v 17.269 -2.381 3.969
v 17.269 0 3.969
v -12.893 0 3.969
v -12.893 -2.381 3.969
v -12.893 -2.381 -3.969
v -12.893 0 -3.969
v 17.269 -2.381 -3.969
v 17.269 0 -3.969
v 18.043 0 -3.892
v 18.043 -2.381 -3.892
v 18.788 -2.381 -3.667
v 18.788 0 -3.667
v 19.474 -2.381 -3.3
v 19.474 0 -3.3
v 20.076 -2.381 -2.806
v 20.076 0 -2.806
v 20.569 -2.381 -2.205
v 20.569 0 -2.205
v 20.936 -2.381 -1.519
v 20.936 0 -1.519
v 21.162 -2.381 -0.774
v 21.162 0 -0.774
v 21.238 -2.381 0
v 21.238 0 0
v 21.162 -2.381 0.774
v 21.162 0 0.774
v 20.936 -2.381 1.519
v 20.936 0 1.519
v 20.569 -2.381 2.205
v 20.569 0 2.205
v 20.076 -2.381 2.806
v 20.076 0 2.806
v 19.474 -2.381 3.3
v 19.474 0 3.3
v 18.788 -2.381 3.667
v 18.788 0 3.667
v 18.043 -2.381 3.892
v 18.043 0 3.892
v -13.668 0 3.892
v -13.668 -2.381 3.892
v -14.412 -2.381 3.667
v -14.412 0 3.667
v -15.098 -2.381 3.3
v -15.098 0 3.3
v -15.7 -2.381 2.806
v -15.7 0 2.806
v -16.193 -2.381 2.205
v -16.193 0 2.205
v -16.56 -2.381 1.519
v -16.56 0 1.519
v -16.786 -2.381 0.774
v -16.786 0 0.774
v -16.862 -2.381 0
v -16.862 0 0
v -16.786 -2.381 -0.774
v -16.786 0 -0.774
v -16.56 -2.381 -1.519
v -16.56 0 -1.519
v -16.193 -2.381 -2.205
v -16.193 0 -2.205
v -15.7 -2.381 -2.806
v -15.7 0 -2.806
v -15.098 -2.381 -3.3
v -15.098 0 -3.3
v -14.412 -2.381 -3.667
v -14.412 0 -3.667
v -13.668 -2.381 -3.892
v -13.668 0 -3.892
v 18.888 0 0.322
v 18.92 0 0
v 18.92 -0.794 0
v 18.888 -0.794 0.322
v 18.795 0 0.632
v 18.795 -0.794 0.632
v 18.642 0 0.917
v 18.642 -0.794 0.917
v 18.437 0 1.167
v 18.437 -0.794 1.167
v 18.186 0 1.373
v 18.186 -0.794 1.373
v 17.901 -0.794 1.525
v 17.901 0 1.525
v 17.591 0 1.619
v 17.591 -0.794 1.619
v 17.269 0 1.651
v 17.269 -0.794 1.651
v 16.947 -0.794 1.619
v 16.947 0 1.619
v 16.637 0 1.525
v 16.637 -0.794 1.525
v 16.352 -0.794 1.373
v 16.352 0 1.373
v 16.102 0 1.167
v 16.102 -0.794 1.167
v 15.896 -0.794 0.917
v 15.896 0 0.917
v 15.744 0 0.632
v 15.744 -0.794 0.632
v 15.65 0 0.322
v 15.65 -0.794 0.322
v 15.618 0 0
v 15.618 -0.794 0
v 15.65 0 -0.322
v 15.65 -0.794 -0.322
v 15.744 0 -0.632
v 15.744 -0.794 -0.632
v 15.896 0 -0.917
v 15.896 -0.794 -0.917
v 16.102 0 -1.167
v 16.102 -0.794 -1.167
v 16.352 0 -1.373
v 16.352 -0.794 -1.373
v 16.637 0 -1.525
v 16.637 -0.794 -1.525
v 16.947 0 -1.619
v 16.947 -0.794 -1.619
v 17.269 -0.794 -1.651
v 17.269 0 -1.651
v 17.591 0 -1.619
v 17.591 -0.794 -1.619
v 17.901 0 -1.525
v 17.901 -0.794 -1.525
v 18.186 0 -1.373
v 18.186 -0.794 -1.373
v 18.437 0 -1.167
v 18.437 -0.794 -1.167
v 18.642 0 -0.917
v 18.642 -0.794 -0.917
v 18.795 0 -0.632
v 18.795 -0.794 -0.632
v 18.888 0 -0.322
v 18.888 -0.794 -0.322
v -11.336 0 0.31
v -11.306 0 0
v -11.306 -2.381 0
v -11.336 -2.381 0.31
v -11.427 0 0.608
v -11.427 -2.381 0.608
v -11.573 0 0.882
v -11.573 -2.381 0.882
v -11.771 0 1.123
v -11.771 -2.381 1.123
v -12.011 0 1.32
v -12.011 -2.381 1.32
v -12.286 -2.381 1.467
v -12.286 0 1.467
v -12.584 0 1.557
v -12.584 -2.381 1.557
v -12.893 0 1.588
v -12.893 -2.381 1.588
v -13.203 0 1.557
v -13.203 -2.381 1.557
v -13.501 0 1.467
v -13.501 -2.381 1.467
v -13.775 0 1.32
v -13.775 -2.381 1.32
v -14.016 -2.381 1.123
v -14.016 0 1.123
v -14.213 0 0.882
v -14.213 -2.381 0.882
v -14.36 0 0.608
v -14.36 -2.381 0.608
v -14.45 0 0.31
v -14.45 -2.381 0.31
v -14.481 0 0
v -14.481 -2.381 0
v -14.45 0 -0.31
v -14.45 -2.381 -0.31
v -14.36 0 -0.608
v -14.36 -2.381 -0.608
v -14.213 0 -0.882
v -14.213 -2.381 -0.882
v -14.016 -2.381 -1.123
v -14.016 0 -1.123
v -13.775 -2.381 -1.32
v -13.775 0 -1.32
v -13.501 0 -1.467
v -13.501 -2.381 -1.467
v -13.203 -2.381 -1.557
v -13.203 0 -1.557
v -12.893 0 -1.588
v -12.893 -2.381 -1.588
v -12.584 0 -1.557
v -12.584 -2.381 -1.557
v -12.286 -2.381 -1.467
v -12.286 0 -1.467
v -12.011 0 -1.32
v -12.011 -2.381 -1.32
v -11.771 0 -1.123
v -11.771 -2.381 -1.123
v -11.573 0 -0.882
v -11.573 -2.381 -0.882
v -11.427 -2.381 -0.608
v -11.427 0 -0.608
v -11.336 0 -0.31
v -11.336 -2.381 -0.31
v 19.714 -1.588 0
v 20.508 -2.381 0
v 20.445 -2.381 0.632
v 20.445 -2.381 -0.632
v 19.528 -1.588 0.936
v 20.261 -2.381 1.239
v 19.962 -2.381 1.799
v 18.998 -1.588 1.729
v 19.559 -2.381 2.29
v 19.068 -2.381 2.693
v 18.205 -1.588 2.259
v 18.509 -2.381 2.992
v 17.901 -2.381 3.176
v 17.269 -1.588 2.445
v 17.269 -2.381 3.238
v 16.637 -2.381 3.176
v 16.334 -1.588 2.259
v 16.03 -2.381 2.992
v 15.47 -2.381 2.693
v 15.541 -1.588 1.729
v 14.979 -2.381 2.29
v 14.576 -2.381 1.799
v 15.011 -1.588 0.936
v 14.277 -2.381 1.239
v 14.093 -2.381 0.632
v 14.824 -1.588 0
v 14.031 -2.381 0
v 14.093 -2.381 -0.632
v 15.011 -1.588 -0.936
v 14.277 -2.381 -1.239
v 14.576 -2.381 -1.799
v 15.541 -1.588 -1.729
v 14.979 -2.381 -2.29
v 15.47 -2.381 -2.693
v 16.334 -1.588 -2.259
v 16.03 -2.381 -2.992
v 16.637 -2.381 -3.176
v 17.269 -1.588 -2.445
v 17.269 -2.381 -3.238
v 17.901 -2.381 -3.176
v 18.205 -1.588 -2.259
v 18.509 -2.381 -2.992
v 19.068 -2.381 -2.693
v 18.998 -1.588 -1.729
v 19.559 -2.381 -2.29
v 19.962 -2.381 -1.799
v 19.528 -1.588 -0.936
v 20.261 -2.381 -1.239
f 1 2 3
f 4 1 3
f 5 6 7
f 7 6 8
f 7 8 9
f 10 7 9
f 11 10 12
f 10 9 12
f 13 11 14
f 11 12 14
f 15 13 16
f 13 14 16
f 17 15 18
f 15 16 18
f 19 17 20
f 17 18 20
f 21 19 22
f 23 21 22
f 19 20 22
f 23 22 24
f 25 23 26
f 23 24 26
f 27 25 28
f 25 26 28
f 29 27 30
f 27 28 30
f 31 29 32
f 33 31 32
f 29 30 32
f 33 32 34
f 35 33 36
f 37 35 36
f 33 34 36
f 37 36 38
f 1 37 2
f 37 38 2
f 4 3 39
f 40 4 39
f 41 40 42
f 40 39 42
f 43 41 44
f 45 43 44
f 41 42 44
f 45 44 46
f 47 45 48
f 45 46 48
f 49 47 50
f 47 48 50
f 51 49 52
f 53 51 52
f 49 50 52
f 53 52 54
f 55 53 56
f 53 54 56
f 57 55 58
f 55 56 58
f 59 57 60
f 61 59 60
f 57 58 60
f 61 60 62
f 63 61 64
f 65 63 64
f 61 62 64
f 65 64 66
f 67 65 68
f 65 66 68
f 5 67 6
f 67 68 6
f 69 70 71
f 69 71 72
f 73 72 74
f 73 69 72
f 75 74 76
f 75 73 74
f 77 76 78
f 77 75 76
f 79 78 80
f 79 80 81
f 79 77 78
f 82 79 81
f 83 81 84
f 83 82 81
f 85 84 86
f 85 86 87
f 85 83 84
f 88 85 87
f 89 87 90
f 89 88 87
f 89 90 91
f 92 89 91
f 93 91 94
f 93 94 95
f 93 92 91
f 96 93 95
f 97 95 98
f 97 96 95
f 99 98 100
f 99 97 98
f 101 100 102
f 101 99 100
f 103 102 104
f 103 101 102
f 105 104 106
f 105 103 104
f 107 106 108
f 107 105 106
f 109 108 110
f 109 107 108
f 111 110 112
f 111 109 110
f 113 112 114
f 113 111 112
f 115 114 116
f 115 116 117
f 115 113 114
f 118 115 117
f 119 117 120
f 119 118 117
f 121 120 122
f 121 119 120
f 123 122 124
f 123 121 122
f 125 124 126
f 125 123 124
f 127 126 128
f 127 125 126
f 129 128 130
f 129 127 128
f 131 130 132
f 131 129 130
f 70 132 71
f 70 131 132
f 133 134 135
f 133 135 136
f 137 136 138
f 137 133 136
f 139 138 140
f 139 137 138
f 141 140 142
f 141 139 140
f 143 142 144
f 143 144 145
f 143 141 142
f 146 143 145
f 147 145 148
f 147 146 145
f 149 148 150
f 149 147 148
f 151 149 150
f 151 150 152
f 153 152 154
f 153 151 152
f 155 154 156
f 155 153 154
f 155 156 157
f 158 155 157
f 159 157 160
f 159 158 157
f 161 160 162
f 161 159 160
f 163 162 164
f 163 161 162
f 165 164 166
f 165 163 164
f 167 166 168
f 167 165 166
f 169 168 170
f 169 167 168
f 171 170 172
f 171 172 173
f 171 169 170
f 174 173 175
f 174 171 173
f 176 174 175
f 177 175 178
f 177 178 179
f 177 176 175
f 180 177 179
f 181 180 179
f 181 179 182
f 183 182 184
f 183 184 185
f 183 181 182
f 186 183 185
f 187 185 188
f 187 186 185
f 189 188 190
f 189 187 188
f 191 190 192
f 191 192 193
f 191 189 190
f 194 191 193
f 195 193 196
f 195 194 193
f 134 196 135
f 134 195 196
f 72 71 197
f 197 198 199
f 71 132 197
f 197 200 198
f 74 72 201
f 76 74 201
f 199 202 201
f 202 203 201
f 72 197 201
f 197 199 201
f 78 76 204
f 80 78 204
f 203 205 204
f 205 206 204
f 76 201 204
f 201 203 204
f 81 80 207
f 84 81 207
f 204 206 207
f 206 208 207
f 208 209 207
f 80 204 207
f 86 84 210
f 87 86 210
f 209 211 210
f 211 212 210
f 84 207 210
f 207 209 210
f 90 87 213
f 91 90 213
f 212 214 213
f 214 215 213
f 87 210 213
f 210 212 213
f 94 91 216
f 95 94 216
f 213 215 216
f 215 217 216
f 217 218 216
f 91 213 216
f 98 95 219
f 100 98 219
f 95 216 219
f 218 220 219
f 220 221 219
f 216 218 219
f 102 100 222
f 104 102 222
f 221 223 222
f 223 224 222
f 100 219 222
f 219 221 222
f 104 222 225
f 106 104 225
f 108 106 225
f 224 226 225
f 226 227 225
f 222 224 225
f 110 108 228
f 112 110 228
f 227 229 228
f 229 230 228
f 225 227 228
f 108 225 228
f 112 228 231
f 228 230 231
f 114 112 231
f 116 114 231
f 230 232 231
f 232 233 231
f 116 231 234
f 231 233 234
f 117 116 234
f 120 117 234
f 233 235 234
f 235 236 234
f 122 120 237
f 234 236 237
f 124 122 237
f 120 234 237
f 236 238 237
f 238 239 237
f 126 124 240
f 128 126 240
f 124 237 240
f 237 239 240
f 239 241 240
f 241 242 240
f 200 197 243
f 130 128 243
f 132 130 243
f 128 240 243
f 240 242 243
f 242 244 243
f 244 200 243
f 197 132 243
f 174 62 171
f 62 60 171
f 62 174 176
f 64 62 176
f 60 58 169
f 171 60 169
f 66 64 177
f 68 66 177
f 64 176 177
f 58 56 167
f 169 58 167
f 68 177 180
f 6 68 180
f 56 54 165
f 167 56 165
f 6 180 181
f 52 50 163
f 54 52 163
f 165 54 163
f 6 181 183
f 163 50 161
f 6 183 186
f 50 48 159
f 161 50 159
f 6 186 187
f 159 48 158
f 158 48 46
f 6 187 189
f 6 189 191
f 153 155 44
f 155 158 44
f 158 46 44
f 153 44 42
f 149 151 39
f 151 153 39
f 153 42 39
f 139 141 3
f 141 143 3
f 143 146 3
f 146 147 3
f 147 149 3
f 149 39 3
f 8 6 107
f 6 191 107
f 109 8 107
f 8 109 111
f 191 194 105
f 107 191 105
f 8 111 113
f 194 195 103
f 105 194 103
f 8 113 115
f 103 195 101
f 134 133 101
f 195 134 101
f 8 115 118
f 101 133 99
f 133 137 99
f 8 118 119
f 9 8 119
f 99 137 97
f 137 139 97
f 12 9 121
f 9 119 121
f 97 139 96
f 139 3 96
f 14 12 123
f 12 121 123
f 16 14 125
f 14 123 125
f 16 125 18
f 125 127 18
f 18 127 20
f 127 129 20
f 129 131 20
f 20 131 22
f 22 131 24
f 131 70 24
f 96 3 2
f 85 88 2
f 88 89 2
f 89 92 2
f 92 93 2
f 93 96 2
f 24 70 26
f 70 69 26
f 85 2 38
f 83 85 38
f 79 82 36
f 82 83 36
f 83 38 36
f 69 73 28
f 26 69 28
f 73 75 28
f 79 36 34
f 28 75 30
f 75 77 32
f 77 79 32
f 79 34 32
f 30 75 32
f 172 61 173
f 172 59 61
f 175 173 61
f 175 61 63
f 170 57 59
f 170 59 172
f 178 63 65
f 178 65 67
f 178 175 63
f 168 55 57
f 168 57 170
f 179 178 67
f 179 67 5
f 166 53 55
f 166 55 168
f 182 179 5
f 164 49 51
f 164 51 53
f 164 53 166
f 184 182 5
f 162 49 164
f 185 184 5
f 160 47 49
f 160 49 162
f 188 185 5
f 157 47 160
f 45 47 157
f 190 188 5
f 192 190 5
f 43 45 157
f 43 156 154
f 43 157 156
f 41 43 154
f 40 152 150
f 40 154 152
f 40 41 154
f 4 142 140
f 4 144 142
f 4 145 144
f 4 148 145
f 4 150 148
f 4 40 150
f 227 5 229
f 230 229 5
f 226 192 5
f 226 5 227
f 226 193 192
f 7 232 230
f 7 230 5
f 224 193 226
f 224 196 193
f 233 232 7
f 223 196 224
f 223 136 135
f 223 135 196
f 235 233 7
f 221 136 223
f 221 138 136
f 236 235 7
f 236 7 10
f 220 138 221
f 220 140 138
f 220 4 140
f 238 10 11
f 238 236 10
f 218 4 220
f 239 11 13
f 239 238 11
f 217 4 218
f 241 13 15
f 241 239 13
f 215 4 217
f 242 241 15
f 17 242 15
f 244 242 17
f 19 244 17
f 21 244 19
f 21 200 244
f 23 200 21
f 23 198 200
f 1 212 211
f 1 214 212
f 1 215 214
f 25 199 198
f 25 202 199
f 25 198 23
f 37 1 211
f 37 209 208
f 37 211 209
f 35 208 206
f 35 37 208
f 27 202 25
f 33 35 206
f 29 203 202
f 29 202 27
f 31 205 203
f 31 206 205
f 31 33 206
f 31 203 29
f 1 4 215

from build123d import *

# Parameters (mm, degrees)
F0_R     = 1.5875
F0_R_2   = 1.651
F1_DEPTH = 2.38125
F2_SIZE2 = 1.5875
F2_SIZE  = 1.5875


with BuildPart() as f1:
    # F0 (on Front) → F1 (new body)
    with BuildSketch(Plane.XZ):
        with BuildLine():
            Line((17.269202, 3.96875), (-12.893298, 3.96875))
            ThreePointArc((-12.893298, 3.96875), (-16.862048, 0), (-12.893298, -3.96875))
            Line((-12.893298, -3.96875), (17.269202, -3.96875))
            ThreePointArc((17.269202, -3.96875), (21.237952, 0), (17.269202, 3.96875))
        make_face()
        with Locations((-12.893298, 0)):
            Circle(F0_R, mode=Mode.SUBTRACT)
        with Locations((17.269202, 0)):
            Circle(F0_R_2, mode=Mode.SUBTRACT)
    extrude(amount=F1_DEPTH)

    # F2
    f2_edges = [f1.edges().sort_by_distance(p)[0] for p in [
        (15.618202, -2.38125, 0),
    ]]
    chamfer(f2_edges, length=F2_SIZE, length2=F2_SIZE2)


solid = f1.part
